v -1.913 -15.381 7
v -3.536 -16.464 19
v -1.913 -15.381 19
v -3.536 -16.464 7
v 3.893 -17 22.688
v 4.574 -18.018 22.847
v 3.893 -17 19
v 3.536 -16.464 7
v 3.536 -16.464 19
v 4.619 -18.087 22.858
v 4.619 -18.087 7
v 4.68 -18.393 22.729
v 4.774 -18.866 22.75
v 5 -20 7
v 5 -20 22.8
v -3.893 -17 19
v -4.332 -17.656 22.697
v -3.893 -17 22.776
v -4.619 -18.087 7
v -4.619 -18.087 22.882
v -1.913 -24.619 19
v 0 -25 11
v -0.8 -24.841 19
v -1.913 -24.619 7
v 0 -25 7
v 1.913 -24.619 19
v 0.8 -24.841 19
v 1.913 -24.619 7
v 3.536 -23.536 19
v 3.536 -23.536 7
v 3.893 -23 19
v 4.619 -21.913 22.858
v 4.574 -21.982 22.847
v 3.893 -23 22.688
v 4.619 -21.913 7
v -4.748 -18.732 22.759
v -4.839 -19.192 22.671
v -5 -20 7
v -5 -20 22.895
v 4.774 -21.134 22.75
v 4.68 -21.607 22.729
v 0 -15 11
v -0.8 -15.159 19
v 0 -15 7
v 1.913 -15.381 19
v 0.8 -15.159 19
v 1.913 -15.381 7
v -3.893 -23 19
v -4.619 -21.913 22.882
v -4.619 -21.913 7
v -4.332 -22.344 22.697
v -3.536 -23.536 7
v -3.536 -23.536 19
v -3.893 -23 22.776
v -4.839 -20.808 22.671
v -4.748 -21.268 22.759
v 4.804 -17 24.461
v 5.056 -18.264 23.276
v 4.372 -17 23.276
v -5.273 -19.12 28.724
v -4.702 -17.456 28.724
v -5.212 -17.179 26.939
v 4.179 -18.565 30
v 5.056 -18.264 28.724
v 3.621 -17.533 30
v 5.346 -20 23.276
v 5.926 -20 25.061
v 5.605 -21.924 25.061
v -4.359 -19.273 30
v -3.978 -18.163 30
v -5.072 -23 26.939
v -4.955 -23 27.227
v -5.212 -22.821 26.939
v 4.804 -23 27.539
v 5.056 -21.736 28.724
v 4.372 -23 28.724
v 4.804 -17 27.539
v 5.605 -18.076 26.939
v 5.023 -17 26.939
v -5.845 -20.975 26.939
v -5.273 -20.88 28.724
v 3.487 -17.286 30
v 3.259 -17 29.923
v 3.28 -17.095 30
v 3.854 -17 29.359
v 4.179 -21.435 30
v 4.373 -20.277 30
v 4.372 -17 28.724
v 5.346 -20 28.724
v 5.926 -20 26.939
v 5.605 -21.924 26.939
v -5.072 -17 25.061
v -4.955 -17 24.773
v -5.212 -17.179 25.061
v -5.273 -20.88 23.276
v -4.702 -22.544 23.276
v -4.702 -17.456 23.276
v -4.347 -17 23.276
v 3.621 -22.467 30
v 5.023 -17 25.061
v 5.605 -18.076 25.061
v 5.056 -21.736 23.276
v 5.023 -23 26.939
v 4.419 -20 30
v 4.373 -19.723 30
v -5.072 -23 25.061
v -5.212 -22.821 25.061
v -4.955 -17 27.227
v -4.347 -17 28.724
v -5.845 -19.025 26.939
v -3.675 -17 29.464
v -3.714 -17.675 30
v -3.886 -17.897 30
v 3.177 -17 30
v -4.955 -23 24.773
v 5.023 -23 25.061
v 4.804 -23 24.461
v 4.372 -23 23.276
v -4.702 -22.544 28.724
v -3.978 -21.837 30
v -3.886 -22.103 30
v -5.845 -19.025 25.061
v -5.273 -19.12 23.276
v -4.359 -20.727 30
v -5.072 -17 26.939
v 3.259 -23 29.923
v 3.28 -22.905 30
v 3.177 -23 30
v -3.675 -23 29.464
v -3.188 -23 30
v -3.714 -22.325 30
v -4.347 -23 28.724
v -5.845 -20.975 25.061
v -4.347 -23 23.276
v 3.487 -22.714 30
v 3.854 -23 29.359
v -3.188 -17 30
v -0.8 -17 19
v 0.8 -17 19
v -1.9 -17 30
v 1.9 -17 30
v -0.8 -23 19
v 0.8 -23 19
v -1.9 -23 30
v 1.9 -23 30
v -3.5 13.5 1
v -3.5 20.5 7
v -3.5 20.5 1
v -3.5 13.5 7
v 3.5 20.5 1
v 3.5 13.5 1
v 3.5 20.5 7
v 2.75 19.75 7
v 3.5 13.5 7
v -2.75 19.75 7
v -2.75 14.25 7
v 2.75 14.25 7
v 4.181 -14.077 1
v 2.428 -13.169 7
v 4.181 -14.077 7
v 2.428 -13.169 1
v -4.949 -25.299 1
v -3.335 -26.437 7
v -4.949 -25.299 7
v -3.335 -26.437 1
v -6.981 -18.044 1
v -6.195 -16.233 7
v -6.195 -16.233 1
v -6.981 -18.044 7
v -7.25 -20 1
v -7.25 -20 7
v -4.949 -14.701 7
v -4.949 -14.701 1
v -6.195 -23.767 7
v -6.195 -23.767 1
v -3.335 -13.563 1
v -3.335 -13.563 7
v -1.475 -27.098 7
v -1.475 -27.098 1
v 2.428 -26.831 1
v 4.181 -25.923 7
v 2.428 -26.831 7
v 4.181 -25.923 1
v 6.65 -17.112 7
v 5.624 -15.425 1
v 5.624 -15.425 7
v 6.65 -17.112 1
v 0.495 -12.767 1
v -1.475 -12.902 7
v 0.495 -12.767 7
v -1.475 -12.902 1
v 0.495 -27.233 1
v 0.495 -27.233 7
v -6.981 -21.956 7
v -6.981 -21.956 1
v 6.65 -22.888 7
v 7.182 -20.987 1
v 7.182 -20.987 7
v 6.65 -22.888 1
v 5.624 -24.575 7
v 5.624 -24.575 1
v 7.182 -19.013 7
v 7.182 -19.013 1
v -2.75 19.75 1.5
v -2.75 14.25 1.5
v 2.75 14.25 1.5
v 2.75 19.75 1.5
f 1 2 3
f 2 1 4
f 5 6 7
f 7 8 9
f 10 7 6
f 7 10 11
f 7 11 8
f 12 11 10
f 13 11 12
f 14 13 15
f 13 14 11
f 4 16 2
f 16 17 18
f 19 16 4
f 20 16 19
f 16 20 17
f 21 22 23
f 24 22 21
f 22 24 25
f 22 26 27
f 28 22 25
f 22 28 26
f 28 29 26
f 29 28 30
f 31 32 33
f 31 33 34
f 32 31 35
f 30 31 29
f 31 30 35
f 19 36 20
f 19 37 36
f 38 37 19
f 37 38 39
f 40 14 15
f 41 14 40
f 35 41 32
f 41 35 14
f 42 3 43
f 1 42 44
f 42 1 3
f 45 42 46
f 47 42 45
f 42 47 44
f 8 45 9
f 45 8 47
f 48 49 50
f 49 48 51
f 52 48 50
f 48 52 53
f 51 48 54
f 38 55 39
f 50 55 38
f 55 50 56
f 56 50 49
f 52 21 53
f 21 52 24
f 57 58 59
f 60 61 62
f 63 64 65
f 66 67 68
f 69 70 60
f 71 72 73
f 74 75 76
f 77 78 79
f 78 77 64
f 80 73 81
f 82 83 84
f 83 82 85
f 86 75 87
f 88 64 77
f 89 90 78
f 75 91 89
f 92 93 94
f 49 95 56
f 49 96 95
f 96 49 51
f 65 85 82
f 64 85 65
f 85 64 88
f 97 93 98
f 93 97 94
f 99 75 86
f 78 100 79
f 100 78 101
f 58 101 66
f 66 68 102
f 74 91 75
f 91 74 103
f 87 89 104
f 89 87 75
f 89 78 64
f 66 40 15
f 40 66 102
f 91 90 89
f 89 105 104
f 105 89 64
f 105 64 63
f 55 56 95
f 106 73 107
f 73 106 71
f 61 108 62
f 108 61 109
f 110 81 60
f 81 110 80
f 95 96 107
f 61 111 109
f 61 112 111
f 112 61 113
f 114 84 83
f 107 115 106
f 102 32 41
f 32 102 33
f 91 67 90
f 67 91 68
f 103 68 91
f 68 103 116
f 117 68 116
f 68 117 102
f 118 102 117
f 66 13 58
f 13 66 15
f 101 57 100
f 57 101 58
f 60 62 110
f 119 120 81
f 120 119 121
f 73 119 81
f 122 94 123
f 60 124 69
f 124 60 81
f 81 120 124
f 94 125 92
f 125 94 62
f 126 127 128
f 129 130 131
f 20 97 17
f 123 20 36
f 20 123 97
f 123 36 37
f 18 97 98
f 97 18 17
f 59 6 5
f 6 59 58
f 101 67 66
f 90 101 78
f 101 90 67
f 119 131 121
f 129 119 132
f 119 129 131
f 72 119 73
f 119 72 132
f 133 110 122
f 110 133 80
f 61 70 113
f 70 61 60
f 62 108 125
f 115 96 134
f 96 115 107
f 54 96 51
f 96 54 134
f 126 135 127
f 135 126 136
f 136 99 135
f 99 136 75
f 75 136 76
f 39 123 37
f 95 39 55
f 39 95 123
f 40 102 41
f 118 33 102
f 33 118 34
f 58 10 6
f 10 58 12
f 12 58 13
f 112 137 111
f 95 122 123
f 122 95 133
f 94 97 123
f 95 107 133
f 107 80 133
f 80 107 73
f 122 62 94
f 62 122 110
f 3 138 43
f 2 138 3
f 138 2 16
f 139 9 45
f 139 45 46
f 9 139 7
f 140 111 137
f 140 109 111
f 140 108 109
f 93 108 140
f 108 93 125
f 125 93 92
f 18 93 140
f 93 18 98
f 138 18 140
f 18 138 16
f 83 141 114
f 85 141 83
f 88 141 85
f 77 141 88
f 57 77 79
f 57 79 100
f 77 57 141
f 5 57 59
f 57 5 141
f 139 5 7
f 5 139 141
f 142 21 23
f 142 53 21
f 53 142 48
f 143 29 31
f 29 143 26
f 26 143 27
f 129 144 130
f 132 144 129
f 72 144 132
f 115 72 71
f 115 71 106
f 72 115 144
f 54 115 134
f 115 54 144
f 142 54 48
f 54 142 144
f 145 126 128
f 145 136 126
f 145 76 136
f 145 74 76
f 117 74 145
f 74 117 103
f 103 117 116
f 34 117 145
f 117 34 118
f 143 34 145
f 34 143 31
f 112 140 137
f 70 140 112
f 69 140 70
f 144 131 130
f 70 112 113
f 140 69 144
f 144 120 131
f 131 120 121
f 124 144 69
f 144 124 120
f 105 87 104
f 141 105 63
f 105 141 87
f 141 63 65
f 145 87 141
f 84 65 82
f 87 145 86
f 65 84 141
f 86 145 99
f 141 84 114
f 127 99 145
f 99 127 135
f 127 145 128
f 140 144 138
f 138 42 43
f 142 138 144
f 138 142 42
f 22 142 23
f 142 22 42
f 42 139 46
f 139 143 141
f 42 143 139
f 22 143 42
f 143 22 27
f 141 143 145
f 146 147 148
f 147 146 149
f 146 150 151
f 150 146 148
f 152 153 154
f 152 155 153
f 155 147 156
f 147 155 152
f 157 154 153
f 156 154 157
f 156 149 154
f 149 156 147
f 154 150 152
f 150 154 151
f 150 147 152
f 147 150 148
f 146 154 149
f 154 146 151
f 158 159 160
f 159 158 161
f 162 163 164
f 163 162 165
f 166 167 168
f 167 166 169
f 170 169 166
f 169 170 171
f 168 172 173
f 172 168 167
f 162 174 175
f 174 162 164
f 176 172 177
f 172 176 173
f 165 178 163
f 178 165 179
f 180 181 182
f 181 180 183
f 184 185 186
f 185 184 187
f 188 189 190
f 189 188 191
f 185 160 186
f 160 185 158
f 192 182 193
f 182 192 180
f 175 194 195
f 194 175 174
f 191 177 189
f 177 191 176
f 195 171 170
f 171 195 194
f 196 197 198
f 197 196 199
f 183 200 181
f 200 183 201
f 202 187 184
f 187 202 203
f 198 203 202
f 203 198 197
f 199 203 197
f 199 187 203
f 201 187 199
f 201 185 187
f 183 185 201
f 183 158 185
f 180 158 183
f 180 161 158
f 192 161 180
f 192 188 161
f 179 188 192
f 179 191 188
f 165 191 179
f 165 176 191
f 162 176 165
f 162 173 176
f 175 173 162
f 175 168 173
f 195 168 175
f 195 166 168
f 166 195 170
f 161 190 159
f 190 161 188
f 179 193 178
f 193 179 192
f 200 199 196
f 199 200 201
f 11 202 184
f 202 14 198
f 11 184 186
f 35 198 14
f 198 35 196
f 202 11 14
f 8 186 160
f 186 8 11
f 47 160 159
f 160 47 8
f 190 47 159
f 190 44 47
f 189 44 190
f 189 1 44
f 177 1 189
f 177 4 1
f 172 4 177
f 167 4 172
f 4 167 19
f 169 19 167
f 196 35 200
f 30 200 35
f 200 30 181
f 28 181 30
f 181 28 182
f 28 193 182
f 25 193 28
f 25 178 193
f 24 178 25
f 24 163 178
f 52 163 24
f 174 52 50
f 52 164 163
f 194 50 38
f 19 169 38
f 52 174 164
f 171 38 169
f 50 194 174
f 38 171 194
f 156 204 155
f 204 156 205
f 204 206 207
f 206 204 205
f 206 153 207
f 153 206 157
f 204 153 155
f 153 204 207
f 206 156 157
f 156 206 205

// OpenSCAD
// file: snaps.scad
module pinshape(r=5,bellend=6,h=20) {
	union() {
		cylinder(r=r,h=h);
		translate([0,0,h]) sphere(r = bellend);
		}
}


module pin (h=20) {
	difference () {
		pinshape(h=h);
		translate([-10,3,h-7]) cube([20,10,30]);
		translate([-10,-13,h-7]) cube([20,10,30]);
		translate([-10,-10,h+4]) cube([20,20,10]);
		translate([0,10,6]) rotate([90, 0, 0]) linear_extrude(height=20) polygon(points=[[0,0],[-10,100],[10,100]],paths=[ [0,1,2] ]);
	}
}

module pinhole (h=20) {
		pinshape(r=5.25,bellend=6.25,h=h);
}

union () {
	translate([0,0,1]) pin(h=21);
	translate([-7.5,-7.5,0]) cube([15,15,2]);
}

/*
translate([18,0,27.25]) rotate([0,180,0]) difference () {
	cylinder(r=7.25, h=27.27);
	translate([0,0,-1]) pinhole();
}
*/
// file: mozlove.scad
use <snaps.scad>

module _pegs(r=0.75) {
	translate([-19,0,0]) cylinder(h=3,r=r, $fn=10);
	translate([-19,-4,0]) cylinder(h=3,r=r, $fn=10);
	translate([-10.75,-3,0]) cylinder(h=3,r=r, $fn=10);
	translate([-6,-0.5,0]) cylinder(h=3,r=r, $fn=10);
	translate([1.5,1.5,0]) cylinder(h=3,r=r, $fn=10);
	translate([-2.5,-5,0]) cylinder(h=3,r=r, $fn=10);
	translate([5.4,-4.5,0]) cylinder(h=3,r=r, $fn=10);
	translate([5.4,1.5,0]) cylinder(h=3,r=r, $fn=10);
	translate([5.3,5.1,0]) cylinder(h=3,r=r, $fn=10);
	translate([9.5,-4.5,0]) cylinder(h=3,r=r, $fn=10);
	translate([9.5,4.5,0]) cylinder(h=3,r=r, $fn=10);
	translate([14.2,-4.5,0]) cylinder(h=3,r=r, $fn=10);
	translate([14.2,4.5,0]) cylinder(h=3,r=r, $fn=10);
	translate([18.75,-4.5,0]) cylinder(h=3,r=r, $fn=10);
	translate([23,1,0]) cylinder(h=3,r=r, $fn=10);
}

module mozilla(h=4, pegs=true) {
	width = 50;
	height = 13;
	union () {
		color("white") translate([width/-2,height/-2,0]) linear_extrude(height = h, convexity = 10)
		resize(newsize=[width,height,0])
		import (file = "mozilla.dxf");
		if (pegs) {
			translate([0,0,-1])  _pegs();
		}
	}
}

module heart(width=70.25, height=58.25, depth=15) {
	linear_extrude(height = depth, convexity = 10)
	translate([width/-2, height/-2, 0]) resize(newsize=[width,height,0])
	import (file = "heart.dxf");
}

module heart_inset(width=65.775, height=53.581, depth=15) {
	linear_extrude(height = depth, convexity = 10)
	translate([width/-2, height/-2, 0]) resize(newsize=[width,height,0])
	import (file = "heart_inset.dxf");
}

module top_lid(pegs=true) {
	color ("red") difference () {
		union () {
			difference () {
				heart(depth=7);
				translate([0, 0, -0.5]) heart_inset(depth=5.5);
				if (pegs) {
					translate([0, 7.5, 6]) _pegs(r=1);
				} else {
					translate([0, 7.5, 6]) mozilla(pegs=false);
				}
			}
			//translate([0,-21.5,0]) pinplace();
			translate([-3.5, 13.5, 0]) cube([7,7,6]);
			translate([0,-20,2]) rotate([0,180,0]) pin(h=21);
			translate([0,-20,0]) cylinder(r=7.25, h=6);
		}
		translate([-2.75,14.25,-0.5]) cube([5.5,5.5,6]);
	}
}

module box_body() {
	color ("red") difference () {
		union () {
			difference () {
				heart(depth=30);
				translate([0, 0, 3]) heart_inset(depth=30);
			}
			translate([-3.5, 13.5, 1]) cube([7,7,29]);
			translate([0,-20,1]) cylinder(r=7.25, h=29);

		}
		translate([-2.75,14.25,24.5]) cube([5.5,5.5,6]);
		translate([0, -20, 31]) rotate([0,180,0]) pinhole();
	}
}

//box_body();
top_lid();
//translate([-25,2,36]) mozilla(height=4);
//mozilla();

//experiment();
//translate([-25, -45, 0])  mozilla(height=5);
// main file
use <mozlove.scad>
pegs=true;

//intersection() {
translate([0,0,7]) rotate([0,180,0]) top_lid(pegs=pegs);
//translate([0,7.5,0]) cube([60,15,4], center=true);
//}
